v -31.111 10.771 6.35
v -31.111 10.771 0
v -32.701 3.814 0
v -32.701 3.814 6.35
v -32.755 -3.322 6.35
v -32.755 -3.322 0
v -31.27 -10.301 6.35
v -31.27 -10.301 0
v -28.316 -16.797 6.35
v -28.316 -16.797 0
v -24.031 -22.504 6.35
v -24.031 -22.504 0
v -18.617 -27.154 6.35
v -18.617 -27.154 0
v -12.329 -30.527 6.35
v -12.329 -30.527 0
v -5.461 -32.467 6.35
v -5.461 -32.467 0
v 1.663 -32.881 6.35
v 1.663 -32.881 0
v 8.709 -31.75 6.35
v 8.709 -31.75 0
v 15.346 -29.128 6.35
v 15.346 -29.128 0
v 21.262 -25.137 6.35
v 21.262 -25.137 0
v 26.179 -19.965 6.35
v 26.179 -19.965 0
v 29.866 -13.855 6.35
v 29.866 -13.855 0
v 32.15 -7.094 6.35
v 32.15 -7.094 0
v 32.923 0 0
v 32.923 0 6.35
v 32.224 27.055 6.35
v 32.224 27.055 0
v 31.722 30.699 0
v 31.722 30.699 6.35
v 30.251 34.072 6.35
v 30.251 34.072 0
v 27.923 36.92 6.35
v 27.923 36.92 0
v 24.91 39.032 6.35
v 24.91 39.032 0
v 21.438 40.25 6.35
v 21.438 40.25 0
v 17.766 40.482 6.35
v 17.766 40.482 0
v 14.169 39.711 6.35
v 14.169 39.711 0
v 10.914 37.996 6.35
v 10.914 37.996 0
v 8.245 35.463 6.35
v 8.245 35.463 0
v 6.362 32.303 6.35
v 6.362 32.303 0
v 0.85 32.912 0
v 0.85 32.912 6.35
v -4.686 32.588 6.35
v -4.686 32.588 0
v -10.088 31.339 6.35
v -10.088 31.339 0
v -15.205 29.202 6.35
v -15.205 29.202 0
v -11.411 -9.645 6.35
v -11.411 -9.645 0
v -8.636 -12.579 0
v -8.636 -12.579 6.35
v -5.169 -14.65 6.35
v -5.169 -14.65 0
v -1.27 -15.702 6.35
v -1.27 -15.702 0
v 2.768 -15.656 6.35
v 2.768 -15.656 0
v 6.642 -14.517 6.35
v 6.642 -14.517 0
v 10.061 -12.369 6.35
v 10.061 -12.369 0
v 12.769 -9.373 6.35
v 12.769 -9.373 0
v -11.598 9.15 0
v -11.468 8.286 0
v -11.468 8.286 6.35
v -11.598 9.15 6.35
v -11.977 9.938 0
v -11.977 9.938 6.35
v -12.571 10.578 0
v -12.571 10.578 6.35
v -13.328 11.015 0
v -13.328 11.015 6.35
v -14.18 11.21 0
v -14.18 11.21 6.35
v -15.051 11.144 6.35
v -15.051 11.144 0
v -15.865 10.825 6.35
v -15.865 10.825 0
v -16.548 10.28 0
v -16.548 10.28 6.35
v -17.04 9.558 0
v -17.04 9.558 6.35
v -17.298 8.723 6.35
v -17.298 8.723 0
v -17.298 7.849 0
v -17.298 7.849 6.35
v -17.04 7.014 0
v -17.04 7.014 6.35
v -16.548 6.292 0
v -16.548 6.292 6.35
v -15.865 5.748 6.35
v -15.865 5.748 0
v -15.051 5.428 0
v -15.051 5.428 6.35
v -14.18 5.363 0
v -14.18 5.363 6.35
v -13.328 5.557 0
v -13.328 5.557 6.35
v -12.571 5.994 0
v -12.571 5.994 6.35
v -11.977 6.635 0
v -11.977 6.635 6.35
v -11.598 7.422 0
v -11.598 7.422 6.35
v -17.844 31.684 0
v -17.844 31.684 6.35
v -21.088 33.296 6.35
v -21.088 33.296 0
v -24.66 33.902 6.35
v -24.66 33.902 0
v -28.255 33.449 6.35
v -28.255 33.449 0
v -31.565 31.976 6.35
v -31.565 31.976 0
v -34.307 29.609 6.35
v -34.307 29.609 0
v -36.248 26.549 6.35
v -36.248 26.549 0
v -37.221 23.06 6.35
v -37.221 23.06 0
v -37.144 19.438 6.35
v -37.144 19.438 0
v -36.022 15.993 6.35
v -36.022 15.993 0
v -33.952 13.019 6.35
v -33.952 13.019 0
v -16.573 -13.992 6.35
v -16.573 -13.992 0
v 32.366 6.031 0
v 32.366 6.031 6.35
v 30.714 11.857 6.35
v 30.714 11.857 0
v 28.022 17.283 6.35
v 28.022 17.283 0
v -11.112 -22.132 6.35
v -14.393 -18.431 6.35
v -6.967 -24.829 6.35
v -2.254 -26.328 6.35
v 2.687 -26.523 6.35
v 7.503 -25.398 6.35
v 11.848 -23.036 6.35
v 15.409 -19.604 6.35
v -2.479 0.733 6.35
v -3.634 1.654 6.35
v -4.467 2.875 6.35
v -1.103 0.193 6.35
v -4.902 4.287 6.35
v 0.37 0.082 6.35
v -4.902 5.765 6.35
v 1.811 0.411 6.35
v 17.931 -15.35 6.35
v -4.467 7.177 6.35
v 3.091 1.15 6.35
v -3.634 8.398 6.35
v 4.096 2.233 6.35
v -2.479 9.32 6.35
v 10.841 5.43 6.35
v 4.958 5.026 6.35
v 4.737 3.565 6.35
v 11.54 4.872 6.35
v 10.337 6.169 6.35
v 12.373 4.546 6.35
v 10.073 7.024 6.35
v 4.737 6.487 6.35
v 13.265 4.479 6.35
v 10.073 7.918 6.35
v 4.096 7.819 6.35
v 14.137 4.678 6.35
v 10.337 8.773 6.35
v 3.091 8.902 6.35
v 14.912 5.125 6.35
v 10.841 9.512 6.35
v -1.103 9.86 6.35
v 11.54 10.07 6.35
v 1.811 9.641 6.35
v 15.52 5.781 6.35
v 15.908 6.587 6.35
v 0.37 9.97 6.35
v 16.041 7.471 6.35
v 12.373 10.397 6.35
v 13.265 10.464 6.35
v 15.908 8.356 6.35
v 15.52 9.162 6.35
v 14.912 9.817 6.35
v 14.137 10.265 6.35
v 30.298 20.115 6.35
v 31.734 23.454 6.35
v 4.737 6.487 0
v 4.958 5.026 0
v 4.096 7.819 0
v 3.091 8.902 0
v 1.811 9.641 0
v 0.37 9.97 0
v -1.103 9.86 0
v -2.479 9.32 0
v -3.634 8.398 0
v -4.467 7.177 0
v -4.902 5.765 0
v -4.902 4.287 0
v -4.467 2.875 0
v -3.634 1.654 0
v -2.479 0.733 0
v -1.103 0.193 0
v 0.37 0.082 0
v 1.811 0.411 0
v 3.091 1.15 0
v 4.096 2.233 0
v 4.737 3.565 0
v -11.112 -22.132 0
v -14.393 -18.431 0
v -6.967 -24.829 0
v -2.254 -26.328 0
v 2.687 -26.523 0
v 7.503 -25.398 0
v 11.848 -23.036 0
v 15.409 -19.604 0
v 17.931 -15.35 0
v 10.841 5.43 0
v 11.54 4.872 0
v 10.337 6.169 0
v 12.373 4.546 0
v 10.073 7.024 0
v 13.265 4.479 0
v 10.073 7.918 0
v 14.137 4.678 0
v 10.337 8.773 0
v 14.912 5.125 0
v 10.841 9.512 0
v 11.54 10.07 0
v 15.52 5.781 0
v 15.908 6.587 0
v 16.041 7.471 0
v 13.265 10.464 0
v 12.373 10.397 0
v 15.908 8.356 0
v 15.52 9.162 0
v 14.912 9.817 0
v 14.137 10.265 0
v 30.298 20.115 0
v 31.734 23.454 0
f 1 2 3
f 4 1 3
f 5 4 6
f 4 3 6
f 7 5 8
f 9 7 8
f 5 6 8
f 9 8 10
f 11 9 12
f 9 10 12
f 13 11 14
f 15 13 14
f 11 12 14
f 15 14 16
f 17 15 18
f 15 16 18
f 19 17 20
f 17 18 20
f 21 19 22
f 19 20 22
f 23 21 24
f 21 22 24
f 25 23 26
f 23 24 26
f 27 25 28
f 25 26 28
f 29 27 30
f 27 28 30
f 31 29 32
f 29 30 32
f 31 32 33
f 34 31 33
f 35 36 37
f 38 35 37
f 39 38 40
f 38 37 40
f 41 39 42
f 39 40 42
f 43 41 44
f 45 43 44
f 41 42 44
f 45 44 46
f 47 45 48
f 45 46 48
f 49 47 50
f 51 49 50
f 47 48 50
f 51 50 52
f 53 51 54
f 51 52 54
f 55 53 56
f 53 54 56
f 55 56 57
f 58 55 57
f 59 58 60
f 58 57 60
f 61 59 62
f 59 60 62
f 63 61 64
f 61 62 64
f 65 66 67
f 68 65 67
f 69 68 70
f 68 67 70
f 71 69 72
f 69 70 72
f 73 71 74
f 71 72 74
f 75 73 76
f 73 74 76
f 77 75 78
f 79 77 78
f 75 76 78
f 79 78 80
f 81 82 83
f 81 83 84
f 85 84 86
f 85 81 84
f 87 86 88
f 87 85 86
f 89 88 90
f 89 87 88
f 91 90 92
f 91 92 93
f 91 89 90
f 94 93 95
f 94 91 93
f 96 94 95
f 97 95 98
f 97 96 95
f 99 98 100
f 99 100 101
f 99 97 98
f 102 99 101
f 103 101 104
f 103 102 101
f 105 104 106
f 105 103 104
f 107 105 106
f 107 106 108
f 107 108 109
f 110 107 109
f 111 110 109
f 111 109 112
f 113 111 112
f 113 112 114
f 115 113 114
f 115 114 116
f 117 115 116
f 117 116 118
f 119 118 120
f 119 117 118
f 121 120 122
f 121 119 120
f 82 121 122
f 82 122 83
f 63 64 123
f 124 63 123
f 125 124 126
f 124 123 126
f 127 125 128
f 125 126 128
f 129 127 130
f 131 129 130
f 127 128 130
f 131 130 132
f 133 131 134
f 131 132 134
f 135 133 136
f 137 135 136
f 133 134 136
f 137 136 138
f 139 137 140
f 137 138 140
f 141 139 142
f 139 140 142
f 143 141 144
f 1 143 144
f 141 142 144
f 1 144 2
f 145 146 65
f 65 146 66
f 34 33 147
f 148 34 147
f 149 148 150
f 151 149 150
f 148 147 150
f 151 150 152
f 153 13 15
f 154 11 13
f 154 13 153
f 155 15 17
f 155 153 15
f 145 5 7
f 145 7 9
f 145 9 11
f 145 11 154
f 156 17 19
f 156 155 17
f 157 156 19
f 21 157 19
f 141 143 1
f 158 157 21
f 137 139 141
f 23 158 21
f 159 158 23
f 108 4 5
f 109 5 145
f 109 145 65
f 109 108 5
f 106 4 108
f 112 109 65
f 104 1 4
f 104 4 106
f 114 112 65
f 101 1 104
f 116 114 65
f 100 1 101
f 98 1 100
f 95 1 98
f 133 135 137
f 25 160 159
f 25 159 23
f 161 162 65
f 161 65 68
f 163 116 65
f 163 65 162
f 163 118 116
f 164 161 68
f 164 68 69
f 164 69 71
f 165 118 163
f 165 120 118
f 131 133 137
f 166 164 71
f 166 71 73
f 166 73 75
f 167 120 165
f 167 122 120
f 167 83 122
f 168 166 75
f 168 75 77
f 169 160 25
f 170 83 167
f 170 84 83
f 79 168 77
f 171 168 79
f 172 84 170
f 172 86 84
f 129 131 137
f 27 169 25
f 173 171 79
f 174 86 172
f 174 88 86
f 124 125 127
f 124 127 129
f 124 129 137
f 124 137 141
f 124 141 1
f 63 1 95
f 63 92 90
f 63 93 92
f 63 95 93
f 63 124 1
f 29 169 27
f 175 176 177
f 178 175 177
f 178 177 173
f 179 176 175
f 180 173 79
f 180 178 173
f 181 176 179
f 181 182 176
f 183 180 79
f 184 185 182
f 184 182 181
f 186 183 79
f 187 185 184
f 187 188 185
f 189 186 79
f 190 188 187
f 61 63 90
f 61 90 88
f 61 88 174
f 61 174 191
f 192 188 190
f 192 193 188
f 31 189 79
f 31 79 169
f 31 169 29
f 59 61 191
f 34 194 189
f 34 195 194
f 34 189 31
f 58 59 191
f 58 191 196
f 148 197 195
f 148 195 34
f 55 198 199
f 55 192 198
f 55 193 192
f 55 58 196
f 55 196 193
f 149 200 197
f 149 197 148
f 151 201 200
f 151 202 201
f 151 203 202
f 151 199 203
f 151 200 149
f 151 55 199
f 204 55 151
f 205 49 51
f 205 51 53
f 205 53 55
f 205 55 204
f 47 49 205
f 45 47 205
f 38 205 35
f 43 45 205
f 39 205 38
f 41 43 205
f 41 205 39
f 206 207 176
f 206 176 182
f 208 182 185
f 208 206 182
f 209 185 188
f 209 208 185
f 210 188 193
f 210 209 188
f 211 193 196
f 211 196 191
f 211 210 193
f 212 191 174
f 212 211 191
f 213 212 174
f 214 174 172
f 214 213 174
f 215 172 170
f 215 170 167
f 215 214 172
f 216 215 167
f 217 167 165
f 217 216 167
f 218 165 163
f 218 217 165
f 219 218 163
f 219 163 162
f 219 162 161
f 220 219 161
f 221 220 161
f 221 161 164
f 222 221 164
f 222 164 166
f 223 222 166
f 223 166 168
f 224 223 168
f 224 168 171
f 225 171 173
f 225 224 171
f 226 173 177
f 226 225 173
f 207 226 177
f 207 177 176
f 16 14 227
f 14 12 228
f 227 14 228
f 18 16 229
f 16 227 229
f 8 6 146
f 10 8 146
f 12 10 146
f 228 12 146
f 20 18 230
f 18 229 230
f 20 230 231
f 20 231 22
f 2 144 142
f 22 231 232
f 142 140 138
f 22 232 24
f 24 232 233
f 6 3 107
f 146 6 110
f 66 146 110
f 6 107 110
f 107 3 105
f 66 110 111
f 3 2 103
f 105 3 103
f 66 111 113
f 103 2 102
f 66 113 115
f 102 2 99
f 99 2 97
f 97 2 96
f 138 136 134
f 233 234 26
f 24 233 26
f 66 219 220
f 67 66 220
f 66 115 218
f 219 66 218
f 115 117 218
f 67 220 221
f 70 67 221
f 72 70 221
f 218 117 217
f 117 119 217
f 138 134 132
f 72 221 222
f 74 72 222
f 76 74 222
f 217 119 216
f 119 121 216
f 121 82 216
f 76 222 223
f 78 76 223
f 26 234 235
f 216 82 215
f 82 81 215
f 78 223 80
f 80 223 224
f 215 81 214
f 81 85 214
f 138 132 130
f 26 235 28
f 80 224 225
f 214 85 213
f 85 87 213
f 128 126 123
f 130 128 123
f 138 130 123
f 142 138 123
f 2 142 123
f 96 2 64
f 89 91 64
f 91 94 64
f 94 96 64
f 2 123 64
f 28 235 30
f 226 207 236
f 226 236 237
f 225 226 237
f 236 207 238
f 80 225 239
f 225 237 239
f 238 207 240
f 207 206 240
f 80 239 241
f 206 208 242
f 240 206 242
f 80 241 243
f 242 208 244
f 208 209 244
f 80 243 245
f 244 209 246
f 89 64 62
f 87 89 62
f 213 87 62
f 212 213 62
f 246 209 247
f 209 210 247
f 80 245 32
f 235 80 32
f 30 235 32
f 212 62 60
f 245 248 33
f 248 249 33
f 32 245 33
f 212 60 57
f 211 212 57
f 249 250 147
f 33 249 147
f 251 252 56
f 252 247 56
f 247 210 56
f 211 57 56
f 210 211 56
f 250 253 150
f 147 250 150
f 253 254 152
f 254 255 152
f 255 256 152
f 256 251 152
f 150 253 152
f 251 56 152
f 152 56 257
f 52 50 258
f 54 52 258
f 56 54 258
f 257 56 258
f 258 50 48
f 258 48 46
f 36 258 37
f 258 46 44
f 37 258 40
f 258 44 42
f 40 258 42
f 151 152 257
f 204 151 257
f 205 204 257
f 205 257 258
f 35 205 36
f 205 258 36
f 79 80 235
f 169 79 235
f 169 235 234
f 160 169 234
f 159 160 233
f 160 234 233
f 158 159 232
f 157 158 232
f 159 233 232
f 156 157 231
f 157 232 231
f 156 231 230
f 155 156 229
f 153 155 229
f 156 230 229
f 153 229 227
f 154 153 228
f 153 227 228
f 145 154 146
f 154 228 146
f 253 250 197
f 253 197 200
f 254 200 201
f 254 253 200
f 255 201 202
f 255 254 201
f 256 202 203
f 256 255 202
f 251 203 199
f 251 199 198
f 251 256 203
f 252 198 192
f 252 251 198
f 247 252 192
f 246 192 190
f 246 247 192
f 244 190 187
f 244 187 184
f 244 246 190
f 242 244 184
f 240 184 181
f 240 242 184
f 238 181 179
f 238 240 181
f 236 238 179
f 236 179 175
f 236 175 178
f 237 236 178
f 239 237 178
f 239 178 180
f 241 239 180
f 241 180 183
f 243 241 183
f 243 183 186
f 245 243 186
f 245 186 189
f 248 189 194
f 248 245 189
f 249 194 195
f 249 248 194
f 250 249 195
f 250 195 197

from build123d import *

# Parameters (mm, degrees)
F0_R     = 2.9315059489
F0_R_2   = 4.9577082706
F0_R_3   = 3.0008121714
F1_DEPTH = 6.35


with BuildPart() as f1:
    # F0 (on Top) → F1 (new body)
    with BuildSketch(Plane.XY):
        with BuildLine():
            ThreePointArc((-31.111174148, 10.771264197), (-5.4612938069, -32.4668994396), (32.9230206583, 0))
            ThreePointArc((32.9230206583, 0), (31.6741105539, 8.9819825144), (28.0221331774, 17.282515484))
            ThreePointArc((28.0221331774, 17.282515484), (11.0885388977, 15.9908350993), (6.3616782796, 32.3025438431))
            ThreePointArc((6.3616782796, 32.3025438431), (-4.6856163495, 32.5878856125), (-15.2049900361, 29.2016021353))
            ThreePointArc((-15.2049900361, 29.2016021353), (-13.2179182524, 25.5820794163), (-12.5301148045, 21.510676046))
            ThreePointArc((-12.5301148045, 21.510676046), (-18.7221234211, 10.7799871913), (-31.111174148, 10.771264197))
        make_face()
        with BuildLine():
            ThreePointArc((17.930932343, -15.3499655426), (0.2098643008, -26.5919373772), (-16.5725294501, -13.9915626496))
            Line((-16.5725294501, -13.9915626496), (-11.4105949178, -9.6446694806))
            ThreePointArc((-11.4105949178, -9.6446694806), (0.750091805, -15.8180913269), (12.7689968795, -9.3729877844))
            Line((12.7689968795, -9.3729877844), (17.930932343, -15.3499655426))
        make_face(mode=Mode.SUBTRACT)
        with Locations((-14.3990833312, 8.286264725)):
            Circle(F0_R, mode=Mode.SUBTRACT)
        with Locations((0, 5.0260950811)):
            Circle(F0_R_2, mode=Mode.SUBTRACT)
        with Locations((13.0406813696, 7.4712228961)):
            Circle(F0_R_3, mode=Mode.SUBTRACT)
        with BuildLine():
            ThreePointArc((6.3616782796, 32.3025438431), (11.0885388977, 15.9908350993), (28.0221331774, 17.282515484))
            ThreePointArc((28.0221331774, 17.282515484), (18.760648591, 27.0548212656), (6.3616782796, 32.3025438431))
        make_face()
        with BuildLine():
            ThreePointArc((6.3616782796, 32.3025438431), (18.760648591, 27.0548212656), (28.0221331774, 17.282515484))
            ThreePointArc((28.0221331774, 17.282515484), (31.1293093852, 21.7360538154), (32.2244168983, 27.0548212656))
            ThreePointArc((32.2244168983, 27.0548212656), (21.4379787454, 40.2497051331), (6.3616782796, 32.3025438431))
        make_face()
        with BuildLine():
            ThreePointArc((-15.2049900361, 29.2016021353), (-34.3070925434, 29.6085146222), (-31.111174148, 10.771264197))
            ThreePointArc((-31.111174148, 10.771264197), (-24.9242072153, 21.510676046), (-15.2049900361, 29.2016021353))
        make_face()
        with BuildLine():
            ThreePointArc((-15.2049900361, 29.2016021353), (-24.9242072153, 21.510676046), (-31.111174148, 10.771264197))
            ThreePointArc((-31.111174148, 10.771264197), (-18.7221234211, 10.7799871913), (-12.5301148045, 21.510676046))
            ThreePointArc((-12.5301148045, 21.510676046), (-13.2179182524, 25.5820794163), (-15.2049900361, 29.2016021353))
        make_face()
    extrude(amount=F1_DEPTH)


solid = f1.part
